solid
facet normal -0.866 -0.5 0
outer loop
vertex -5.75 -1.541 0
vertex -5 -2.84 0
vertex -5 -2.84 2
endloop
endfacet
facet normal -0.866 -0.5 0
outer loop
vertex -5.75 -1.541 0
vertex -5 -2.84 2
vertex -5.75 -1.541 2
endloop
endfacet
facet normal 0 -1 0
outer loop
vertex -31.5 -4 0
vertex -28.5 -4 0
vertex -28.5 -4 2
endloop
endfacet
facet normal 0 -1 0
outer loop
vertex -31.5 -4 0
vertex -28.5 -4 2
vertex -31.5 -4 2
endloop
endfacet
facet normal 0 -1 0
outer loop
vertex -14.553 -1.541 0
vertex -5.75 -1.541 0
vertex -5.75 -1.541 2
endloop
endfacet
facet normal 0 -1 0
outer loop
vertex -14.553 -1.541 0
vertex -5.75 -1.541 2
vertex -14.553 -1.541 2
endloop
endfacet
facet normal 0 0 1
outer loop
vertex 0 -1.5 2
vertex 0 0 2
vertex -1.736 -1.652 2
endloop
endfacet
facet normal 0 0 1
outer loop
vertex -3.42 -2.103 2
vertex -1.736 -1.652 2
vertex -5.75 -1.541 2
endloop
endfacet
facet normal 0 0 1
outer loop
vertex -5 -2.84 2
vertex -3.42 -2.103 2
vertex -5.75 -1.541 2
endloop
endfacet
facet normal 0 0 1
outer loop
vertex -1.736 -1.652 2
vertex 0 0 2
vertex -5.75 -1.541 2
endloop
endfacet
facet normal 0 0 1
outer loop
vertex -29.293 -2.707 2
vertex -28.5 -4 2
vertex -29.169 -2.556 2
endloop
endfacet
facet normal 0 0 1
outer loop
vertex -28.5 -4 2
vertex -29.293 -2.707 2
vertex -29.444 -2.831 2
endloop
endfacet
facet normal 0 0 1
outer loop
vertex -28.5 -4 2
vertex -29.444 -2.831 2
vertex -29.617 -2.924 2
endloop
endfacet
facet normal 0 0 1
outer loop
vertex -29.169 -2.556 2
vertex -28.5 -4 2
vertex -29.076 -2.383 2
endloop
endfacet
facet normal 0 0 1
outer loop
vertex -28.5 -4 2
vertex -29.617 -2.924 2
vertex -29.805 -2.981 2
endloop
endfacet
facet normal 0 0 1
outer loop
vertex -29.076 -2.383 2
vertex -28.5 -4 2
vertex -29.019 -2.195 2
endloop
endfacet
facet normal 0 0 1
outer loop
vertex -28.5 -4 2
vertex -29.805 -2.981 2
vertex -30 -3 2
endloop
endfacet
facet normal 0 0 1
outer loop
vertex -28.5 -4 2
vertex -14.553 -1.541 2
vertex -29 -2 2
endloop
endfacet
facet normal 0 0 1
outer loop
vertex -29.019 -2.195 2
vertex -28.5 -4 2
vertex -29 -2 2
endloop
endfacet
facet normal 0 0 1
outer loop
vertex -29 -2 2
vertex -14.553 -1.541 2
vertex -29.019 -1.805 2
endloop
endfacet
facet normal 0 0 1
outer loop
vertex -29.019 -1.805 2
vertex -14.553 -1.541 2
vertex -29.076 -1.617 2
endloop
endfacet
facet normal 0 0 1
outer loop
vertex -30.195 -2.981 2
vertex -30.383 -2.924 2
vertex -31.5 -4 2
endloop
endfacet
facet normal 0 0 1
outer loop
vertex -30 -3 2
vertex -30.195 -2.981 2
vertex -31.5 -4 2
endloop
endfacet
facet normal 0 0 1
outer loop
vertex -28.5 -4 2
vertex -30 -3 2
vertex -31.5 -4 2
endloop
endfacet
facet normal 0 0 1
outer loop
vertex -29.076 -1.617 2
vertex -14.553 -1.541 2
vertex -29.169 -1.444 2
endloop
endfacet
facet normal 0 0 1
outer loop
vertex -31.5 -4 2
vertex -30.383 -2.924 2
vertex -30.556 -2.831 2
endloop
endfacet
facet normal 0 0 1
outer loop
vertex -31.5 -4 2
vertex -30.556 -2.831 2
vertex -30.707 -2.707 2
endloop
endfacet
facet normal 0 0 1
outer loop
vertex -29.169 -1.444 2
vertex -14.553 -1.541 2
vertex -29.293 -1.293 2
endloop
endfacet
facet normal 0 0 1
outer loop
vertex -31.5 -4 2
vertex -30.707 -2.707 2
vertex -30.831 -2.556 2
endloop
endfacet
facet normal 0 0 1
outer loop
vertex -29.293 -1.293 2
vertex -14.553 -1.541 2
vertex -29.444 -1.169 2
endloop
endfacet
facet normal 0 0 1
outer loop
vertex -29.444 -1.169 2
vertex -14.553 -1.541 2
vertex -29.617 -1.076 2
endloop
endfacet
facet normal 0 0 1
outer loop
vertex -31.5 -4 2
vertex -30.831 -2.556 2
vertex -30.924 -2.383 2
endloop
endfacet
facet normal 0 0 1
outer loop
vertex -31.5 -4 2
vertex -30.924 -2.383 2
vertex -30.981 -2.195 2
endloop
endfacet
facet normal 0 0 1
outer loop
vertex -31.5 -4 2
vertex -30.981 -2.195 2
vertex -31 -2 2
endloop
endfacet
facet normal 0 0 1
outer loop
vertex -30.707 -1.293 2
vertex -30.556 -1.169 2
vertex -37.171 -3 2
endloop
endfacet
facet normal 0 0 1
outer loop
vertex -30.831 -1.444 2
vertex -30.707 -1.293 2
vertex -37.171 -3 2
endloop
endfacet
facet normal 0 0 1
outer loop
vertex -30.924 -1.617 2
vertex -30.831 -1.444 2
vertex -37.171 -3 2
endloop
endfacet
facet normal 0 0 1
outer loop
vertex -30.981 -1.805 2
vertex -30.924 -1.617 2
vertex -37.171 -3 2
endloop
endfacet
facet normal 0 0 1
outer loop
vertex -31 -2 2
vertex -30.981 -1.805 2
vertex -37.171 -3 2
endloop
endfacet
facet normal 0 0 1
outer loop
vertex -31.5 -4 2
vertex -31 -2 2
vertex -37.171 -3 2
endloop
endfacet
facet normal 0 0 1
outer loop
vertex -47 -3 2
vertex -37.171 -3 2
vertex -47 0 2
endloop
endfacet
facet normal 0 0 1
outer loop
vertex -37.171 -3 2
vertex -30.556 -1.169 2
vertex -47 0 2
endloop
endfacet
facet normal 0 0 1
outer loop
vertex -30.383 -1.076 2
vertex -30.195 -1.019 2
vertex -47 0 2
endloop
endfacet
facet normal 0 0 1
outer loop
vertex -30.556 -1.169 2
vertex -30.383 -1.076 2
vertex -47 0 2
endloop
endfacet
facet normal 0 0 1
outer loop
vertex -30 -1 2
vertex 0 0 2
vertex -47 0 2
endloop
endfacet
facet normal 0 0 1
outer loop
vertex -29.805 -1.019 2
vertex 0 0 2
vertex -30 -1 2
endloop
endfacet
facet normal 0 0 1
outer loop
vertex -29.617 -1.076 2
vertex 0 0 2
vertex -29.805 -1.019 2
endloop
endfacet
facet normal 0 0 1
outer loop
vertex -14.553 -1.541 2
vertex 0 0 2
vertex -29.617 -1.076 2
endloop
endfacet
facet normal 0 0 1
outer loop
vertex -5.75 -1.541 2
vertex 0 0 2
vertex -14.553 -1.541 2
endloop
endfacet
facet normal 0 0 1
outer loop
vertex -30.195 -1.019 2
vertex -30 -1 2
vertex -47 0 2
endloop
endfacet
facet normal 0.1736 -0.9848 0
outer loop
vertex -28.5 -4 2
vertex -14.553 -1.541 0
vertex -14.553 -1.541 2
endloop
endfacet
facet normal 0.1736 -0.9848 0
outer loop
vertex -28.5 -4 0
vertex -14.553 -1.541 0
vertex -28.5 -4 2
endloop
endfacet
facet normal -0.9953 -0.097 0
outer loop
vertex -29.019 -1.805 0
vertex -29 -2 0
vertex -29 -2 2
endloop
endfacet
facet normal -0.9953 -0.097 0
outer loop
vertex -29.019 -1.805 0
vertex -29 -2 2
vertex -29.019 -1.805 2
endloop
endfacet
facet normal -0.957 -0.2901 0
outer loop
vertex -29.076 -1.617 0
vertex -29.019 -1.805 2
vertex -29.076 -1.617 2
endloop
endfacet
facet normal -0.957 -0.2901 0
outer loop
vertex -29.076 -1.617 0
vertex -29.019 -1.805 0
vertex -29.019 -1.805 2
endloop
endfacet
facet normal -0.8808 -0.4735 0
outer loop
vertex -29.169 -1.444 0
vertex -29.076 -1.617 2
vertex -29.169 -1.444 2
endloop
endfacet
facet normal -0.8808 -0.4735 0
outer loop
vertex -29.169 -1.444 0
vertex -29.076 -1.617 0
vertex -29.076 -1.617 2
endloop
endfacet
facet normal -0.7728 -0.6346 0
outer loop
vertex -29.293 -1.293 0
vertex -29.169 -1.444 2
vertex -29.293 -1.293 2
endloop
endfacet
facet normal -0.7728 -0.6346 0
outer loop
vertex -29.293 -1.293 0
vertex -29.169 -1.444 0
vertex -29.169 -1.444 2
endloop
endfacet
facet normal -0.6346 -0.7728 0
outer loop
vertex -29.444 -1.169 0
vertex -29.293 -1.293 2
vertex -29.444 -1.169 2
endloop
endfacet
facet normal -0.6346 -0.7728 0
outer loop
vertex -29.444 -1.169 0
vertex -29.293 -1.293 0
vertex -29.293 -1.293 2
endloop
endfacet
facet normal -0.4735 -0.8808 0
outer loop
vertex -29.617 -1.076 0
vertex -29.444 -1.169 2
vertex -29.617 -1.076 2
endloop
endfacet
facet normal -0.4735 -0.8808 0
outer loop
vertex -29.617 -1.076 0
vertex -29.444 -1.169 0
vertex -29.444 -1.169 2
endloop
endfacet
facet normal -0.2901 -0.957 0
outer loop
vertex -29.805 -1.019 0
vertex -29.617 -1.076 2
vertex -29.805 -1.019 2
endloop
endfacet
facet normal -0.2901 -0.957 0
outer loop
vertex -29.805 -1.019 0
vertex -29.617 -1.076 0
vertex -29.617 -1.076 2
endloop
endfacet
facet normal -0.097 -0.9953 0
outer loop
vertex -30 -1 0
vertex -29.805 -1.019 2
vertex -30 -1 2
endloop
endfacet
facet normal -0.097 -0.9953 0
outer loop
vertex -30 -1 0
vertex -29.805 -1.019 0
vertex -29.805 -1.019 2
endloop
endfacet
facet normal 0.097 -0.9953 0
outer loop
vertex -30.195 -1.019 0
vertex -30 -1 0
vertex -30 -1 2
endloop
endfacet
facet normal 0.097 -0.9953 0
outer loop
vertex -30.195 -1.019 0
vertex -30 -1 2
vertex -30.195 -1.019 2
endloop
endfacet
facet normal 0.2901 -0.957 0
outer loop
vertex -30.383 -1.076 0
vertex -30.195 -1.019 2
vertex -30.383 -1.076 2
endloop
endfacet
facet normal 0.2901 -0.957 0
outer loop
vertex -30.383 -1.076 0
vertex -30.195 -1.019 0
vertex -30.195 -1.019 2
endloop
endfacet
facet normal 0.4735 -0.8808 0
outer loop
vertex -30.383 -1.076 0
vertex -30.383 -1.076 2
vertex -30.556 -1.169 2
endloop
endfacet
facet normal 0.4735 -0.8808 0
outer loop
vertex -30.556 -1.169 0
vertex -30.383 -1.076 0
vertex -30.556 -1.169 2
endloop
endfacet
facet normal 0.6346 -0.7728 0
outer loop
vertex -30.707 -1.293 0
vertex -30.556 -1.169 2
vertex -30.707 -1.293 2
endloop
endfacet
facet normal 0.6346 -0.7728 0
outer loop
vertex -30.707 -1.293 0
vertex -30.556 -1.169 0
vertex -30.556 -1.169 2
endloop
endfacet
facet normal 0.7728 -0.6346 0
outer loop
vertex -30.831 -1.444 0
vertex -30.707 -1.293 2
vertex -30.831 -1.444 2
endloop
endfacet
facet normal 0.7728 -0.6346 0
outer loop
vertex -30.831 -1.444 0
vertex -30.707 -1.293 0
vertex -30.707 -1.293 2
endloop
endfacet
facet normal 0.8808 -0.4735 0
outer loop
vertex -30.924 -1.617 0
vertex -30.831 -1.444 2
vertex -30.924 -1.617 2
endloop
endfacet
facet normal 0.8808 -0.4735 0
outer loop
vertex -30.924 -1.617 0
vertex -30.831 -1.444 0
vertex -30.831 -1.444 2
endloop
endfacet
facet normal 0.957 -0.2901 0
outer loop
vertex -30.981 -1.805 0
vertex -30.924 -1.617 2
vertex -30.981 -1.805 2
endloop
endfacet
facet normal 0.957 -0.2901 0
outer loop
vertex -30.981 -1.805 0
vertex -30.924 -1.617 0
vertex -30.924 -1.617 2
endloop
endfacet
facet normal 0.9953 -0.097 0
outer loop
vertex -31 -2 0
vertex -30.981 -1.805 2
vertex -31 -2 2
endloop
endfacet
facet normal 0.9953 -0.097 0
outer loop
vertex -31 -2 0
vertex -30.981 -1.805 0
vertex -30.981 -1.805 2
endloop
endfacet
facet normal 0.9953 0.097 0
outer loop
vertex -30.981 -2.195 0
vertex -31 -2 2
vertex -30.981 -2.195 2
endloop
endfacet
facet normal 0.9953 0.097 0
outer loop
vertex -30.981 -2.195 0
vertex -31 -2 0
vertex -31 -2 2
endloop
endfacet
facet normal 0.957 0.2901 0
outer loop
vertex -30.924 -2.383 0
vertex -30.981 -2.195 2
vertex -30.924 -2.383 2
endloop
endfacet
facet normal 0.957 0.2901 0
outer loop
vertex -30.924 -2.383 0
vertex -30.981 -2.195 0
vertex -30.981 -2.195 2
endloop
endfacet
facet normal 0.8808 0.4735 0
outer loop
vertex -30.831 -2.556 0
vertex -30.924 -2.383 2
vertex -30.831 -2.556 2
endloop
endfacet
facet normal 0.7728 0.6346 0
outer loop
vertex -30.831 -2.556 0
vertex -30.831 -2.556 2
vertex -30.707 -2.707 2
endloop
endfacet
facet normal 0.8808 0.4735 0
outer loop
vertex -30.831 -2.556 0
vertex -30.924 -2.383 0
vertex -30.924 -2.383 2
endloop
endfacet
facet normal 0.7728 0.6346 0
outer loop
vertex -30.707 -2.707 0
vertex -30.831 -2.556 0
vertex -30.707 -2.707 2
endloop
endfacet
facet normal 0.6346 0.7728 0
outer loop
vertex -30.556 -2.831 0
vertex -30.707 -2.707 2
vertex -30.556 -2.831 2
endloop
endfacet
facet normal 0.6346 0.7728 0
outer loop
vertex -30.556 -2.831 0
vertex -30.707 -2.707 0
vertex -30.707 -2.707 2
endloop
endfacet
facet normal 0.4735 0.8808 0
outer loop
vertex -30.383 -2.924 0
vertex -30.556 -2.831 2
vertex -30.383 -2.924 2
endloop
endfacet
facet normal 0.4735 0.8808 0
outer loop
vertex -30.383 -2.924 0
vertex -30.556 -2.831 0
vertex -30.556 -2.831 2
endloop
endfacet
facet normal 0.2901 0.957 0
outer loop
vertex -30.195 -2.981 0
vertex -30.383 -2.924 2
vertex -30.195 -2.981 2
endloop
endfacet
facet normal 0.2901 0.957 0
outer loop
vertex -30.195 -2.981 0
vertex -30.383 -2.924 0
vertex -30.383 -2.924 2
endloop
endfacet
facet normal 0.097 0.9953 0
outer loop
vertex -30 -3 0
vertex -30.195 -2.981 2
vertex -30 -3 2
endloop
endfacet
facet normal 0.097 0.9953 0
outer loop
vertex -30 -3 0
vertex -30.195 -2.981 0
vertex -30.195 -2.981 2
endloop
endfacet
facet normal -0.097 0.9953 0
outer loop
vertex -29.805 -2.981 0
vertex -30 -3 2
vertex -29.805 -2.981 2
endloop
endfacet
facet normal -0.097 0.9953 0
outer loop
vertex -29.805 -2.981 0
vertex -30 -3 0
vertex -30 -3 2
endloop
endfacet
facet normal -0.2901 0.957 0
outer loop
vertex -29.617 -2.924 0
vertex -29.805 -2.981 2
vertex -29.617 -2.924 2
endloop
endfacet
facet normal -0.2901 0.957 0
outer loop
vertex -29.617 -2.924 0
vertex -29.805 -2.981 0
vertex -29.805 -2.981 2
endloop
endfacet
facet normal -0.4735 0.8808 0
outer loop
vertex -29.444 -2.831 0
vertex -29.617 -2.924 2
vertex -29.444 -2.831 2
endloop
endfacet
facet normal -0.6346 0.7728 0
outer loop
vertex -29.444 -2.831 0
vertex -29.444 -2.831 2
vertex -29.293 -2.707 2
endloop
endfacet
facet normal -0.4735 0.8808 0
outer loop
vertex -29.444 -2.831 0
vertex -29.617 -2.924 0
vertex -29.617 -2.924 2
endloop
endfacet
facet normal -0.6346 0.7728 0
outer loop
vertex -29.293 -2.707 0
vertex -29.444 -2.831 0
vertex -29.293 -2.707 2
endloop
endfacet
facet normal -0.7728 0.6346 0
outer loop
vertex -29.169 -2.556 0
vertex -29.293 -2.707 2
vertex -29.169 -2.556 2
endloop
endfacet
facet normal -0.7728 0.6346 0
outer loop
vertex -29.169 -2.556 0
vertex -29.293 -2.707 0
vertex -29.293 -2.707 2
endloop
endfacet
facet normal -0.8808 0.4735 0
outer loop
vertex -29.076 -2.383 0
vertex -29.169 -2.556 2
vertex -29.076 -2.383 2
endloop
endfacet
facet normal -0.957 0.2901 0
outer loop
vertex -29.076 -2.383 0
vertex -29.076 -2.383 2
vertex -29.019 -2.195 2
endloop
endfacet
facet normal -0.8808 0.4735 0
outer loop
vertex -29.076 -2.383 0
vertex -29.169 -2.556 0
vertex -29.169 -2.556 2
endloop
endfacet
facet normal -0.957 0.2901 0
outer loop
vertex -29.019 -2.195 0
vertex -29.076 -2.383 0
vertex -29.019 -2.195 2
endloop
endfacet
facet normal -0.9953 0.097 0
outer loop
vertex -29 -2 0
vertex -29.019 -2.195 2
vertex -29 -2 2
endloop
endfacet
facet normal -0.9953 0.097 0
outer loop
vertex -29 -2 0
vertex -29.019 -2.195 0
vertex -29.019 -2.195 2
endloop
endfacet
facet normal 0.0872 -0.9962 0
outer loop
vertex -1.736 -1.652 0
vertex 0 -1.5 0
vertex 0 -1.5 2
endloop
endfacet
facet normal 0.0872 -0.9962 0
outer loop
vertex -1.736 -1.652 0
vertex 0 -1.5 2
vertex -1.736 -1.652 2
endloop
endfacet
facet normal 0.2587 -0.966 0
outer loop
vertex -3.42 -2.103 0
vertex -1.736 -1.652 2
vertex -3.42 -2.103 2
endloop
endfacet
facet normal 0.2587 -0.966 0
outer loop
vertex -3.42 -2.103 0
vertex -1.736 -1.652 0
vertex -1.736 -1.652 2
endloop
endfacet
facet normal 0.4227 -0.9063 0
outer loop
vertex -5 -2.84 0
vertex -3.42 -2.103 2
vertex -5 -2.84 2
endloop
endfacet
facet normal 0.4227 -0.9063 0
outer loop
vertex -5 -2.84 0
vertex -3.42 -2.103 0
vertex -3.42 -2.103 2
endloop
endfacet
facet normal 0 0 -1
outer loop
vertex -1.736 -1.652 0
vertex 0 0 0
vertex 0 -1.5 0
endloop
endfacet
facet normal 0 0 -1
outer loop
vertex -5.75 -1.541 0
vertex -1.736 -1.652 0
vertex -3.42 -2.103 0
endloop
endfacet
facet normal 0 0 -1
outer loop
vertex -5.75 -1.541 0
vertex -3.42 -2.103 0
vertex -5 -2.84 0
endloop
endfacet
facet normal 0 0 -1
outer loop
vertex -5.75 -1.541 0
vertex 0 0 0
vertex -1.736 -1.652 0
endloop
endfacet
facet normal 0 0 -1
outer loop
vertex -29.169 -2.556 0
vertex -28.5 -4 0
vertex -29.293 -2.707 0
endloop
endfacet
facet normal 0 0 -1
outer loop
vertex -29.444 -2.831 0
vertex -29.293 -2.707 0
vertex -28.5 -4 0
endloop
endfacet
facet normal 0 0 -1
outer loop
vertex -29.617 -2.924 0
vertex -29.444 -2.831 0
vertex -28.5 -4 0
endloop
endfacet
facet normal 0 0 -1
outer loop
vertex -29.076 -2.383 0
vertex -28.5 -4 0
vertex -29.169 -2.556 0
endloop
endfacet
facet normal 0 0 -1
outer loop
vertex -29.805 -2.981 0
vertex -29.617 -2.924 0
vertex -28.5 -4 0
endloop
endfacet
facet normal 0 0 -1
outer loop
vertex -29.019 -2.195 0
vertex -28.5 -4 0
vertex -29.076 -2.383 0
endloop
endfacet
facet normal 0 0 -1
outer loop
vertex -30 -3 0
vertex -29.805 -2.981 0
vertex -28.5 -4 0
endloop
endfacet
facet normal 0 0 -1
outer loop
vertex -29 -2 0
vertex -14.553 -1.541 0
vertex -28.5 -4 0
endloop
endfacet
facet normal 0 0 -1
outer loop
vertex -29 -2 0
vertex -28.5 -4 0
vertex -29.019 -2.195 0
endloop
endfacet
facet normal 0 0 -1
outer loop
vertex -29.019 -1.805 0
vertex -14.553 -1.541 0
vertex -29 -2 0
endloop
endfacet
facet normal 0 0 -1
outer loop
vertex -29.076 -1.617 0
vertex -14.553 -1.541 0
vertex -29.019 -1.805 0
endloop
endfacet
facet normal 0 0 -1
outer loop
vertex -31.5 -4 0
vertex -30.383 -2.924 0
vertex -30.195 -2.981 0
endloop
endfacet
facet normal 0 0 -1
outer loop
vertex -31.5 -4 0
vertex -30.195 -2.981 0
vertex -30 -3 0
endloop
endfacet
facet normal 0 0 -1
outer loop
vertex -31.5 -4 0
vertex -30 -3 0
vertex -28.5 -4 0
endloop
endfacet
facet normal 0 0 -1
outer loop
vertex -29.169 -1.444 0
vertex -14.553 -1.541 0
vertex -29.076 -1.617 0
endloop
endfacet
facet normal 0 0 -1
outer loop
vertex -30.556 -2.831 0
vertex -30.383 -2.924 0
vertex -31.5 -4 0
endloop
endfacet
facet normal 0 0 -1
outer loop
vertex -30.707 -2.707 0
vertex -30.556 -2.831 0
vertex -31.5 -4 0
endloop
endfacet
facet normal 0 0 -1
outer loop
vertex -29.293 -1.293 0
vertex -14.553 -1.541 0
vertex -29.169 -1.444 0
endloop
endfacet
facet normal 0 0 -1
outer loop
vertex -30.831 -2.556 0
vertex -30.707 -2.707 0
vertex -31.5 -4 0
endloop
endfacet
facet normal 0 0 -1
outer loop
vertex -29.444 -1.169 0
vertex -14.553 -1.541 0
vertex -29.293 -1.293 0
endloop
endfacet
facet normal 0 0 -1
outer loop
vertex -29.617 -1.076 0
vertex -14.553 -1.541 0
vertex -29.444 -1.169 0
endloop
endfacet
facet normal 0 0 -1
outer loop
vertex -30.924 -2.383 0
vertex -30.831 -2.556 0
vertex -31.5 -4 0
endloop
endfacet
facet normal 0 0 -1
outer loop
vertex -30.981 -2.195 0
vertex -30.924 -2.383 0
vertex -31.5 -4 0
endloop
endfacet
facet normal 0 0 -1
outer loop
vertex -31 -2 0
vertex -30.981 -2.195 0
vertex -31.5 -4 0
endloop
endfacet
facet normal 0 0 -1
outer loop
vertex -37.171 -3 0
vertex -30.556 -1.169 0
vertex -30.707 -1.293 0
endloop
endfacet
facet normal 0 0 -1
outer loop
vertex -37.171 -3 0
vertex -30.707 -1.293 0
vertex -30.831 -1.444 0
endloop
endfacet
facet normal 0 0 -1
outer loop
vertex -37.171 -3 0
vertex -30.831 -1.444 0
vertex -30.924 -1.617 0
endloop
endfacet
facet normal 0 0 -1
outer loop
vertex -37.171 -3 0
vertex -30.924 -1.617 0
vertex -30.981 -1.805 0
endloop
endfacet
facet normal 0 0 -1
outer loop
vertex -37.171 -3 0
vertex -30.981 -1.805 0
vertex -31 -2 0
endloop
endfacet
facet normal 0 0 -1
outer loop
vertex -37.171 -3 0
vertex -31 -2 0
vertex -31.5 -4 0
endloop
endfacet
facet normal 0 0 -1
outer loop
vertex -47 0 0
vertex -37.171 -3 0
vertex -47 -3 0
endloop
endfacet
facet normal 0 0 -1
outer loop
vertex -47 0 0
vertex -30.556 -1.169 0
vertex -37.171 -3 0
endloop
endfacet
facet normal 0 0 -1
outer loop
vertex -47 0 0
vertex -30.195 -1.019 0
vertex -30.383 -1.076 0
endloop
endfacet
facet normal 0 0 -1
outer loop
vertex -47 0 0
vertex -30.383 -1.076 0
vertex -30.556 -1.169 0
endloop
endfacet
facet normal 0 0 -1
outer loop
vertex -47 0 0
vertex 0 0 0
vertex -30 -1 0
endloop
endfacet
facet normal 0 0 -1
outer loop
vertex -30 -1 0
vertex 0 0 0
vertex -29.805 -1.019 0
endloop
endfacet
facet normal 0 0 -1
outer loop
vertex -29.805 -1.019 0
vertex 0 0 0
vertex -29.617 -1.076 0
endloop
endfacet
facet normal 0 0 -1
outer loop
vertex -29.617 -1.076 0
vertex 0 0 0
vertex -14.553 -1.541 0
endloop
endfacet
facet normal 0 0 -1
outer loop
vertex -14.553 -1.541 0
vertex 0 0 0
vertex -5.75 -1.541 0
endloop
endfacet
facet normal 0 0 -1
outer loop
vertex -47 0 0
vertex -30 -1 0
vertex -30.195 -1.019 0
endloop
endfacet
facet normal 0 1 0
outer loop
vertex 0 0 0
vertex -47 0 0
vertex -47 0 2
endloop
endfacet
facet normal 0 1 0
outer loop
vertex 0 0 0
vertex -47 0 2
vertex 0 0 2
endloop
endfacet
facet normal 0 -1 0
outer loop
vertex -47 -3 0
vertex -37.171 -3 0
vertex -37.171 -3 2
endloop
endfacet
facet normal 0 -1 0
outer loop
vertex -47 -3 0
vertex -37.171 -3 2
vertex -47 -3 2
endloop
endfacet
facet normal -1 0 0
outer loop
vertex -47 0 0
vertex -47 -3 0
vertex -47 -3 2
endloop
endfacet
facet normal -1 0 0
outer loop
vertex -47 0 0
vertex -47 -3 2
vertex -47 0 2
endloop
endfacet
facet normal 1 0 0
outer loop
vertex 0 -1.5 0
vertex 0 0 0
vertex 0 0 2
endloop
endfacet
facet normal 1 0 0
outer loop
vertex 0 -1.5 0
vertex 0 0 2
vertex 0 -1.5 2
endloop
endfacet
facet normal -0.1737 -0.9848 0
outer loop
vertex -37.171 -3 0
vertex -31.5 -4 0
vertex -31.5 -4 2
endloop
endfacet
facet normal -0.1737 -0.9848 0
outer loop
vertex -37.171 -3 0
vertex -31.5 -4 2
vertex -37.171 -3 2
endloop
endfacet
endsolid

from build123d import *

# Parameters (mm, degrees)
SKICA1_R                = 1
P_IDAT_VYSUNUT_M1_DEPTH = 2


with BuildPart() as part:
    # Skica1 → Přidat vysunutím1 (new body)
    with BuildSketch(Plane.XY):
        with BuildLine():
            Line((0, 0), (0, -1.5))
            ThreePointArc((0, -1.5), (-2.588190451, -1.840741737), (-5, -2.839745962))
            Line((-5, -2.839745962), (-5.75, -1.540707856))
            Line((-5.75, -1.540707856), (-14.552661177, -1.540707856))
            Line((-14.552661177, -1.540707856), (-28.5, -4))
            Line((-28.5, -4), (-31.5, -4))
            Line((-31.5, -4), (-37.17128182, -3))
            Line((-37.17128182, -3), (-47, -3))
            Line((-47, -3), (-47, 0))
            Line((-47, 0), (0, 0))
        make_face()
        with Locations((-30, -2)):
            Circle(SKICA1_R, mode=Mode.SUBTRACT)
    extrude(amount=P_IDAT_VYSUNUT_M1_DEPTH)


solid = part.part
